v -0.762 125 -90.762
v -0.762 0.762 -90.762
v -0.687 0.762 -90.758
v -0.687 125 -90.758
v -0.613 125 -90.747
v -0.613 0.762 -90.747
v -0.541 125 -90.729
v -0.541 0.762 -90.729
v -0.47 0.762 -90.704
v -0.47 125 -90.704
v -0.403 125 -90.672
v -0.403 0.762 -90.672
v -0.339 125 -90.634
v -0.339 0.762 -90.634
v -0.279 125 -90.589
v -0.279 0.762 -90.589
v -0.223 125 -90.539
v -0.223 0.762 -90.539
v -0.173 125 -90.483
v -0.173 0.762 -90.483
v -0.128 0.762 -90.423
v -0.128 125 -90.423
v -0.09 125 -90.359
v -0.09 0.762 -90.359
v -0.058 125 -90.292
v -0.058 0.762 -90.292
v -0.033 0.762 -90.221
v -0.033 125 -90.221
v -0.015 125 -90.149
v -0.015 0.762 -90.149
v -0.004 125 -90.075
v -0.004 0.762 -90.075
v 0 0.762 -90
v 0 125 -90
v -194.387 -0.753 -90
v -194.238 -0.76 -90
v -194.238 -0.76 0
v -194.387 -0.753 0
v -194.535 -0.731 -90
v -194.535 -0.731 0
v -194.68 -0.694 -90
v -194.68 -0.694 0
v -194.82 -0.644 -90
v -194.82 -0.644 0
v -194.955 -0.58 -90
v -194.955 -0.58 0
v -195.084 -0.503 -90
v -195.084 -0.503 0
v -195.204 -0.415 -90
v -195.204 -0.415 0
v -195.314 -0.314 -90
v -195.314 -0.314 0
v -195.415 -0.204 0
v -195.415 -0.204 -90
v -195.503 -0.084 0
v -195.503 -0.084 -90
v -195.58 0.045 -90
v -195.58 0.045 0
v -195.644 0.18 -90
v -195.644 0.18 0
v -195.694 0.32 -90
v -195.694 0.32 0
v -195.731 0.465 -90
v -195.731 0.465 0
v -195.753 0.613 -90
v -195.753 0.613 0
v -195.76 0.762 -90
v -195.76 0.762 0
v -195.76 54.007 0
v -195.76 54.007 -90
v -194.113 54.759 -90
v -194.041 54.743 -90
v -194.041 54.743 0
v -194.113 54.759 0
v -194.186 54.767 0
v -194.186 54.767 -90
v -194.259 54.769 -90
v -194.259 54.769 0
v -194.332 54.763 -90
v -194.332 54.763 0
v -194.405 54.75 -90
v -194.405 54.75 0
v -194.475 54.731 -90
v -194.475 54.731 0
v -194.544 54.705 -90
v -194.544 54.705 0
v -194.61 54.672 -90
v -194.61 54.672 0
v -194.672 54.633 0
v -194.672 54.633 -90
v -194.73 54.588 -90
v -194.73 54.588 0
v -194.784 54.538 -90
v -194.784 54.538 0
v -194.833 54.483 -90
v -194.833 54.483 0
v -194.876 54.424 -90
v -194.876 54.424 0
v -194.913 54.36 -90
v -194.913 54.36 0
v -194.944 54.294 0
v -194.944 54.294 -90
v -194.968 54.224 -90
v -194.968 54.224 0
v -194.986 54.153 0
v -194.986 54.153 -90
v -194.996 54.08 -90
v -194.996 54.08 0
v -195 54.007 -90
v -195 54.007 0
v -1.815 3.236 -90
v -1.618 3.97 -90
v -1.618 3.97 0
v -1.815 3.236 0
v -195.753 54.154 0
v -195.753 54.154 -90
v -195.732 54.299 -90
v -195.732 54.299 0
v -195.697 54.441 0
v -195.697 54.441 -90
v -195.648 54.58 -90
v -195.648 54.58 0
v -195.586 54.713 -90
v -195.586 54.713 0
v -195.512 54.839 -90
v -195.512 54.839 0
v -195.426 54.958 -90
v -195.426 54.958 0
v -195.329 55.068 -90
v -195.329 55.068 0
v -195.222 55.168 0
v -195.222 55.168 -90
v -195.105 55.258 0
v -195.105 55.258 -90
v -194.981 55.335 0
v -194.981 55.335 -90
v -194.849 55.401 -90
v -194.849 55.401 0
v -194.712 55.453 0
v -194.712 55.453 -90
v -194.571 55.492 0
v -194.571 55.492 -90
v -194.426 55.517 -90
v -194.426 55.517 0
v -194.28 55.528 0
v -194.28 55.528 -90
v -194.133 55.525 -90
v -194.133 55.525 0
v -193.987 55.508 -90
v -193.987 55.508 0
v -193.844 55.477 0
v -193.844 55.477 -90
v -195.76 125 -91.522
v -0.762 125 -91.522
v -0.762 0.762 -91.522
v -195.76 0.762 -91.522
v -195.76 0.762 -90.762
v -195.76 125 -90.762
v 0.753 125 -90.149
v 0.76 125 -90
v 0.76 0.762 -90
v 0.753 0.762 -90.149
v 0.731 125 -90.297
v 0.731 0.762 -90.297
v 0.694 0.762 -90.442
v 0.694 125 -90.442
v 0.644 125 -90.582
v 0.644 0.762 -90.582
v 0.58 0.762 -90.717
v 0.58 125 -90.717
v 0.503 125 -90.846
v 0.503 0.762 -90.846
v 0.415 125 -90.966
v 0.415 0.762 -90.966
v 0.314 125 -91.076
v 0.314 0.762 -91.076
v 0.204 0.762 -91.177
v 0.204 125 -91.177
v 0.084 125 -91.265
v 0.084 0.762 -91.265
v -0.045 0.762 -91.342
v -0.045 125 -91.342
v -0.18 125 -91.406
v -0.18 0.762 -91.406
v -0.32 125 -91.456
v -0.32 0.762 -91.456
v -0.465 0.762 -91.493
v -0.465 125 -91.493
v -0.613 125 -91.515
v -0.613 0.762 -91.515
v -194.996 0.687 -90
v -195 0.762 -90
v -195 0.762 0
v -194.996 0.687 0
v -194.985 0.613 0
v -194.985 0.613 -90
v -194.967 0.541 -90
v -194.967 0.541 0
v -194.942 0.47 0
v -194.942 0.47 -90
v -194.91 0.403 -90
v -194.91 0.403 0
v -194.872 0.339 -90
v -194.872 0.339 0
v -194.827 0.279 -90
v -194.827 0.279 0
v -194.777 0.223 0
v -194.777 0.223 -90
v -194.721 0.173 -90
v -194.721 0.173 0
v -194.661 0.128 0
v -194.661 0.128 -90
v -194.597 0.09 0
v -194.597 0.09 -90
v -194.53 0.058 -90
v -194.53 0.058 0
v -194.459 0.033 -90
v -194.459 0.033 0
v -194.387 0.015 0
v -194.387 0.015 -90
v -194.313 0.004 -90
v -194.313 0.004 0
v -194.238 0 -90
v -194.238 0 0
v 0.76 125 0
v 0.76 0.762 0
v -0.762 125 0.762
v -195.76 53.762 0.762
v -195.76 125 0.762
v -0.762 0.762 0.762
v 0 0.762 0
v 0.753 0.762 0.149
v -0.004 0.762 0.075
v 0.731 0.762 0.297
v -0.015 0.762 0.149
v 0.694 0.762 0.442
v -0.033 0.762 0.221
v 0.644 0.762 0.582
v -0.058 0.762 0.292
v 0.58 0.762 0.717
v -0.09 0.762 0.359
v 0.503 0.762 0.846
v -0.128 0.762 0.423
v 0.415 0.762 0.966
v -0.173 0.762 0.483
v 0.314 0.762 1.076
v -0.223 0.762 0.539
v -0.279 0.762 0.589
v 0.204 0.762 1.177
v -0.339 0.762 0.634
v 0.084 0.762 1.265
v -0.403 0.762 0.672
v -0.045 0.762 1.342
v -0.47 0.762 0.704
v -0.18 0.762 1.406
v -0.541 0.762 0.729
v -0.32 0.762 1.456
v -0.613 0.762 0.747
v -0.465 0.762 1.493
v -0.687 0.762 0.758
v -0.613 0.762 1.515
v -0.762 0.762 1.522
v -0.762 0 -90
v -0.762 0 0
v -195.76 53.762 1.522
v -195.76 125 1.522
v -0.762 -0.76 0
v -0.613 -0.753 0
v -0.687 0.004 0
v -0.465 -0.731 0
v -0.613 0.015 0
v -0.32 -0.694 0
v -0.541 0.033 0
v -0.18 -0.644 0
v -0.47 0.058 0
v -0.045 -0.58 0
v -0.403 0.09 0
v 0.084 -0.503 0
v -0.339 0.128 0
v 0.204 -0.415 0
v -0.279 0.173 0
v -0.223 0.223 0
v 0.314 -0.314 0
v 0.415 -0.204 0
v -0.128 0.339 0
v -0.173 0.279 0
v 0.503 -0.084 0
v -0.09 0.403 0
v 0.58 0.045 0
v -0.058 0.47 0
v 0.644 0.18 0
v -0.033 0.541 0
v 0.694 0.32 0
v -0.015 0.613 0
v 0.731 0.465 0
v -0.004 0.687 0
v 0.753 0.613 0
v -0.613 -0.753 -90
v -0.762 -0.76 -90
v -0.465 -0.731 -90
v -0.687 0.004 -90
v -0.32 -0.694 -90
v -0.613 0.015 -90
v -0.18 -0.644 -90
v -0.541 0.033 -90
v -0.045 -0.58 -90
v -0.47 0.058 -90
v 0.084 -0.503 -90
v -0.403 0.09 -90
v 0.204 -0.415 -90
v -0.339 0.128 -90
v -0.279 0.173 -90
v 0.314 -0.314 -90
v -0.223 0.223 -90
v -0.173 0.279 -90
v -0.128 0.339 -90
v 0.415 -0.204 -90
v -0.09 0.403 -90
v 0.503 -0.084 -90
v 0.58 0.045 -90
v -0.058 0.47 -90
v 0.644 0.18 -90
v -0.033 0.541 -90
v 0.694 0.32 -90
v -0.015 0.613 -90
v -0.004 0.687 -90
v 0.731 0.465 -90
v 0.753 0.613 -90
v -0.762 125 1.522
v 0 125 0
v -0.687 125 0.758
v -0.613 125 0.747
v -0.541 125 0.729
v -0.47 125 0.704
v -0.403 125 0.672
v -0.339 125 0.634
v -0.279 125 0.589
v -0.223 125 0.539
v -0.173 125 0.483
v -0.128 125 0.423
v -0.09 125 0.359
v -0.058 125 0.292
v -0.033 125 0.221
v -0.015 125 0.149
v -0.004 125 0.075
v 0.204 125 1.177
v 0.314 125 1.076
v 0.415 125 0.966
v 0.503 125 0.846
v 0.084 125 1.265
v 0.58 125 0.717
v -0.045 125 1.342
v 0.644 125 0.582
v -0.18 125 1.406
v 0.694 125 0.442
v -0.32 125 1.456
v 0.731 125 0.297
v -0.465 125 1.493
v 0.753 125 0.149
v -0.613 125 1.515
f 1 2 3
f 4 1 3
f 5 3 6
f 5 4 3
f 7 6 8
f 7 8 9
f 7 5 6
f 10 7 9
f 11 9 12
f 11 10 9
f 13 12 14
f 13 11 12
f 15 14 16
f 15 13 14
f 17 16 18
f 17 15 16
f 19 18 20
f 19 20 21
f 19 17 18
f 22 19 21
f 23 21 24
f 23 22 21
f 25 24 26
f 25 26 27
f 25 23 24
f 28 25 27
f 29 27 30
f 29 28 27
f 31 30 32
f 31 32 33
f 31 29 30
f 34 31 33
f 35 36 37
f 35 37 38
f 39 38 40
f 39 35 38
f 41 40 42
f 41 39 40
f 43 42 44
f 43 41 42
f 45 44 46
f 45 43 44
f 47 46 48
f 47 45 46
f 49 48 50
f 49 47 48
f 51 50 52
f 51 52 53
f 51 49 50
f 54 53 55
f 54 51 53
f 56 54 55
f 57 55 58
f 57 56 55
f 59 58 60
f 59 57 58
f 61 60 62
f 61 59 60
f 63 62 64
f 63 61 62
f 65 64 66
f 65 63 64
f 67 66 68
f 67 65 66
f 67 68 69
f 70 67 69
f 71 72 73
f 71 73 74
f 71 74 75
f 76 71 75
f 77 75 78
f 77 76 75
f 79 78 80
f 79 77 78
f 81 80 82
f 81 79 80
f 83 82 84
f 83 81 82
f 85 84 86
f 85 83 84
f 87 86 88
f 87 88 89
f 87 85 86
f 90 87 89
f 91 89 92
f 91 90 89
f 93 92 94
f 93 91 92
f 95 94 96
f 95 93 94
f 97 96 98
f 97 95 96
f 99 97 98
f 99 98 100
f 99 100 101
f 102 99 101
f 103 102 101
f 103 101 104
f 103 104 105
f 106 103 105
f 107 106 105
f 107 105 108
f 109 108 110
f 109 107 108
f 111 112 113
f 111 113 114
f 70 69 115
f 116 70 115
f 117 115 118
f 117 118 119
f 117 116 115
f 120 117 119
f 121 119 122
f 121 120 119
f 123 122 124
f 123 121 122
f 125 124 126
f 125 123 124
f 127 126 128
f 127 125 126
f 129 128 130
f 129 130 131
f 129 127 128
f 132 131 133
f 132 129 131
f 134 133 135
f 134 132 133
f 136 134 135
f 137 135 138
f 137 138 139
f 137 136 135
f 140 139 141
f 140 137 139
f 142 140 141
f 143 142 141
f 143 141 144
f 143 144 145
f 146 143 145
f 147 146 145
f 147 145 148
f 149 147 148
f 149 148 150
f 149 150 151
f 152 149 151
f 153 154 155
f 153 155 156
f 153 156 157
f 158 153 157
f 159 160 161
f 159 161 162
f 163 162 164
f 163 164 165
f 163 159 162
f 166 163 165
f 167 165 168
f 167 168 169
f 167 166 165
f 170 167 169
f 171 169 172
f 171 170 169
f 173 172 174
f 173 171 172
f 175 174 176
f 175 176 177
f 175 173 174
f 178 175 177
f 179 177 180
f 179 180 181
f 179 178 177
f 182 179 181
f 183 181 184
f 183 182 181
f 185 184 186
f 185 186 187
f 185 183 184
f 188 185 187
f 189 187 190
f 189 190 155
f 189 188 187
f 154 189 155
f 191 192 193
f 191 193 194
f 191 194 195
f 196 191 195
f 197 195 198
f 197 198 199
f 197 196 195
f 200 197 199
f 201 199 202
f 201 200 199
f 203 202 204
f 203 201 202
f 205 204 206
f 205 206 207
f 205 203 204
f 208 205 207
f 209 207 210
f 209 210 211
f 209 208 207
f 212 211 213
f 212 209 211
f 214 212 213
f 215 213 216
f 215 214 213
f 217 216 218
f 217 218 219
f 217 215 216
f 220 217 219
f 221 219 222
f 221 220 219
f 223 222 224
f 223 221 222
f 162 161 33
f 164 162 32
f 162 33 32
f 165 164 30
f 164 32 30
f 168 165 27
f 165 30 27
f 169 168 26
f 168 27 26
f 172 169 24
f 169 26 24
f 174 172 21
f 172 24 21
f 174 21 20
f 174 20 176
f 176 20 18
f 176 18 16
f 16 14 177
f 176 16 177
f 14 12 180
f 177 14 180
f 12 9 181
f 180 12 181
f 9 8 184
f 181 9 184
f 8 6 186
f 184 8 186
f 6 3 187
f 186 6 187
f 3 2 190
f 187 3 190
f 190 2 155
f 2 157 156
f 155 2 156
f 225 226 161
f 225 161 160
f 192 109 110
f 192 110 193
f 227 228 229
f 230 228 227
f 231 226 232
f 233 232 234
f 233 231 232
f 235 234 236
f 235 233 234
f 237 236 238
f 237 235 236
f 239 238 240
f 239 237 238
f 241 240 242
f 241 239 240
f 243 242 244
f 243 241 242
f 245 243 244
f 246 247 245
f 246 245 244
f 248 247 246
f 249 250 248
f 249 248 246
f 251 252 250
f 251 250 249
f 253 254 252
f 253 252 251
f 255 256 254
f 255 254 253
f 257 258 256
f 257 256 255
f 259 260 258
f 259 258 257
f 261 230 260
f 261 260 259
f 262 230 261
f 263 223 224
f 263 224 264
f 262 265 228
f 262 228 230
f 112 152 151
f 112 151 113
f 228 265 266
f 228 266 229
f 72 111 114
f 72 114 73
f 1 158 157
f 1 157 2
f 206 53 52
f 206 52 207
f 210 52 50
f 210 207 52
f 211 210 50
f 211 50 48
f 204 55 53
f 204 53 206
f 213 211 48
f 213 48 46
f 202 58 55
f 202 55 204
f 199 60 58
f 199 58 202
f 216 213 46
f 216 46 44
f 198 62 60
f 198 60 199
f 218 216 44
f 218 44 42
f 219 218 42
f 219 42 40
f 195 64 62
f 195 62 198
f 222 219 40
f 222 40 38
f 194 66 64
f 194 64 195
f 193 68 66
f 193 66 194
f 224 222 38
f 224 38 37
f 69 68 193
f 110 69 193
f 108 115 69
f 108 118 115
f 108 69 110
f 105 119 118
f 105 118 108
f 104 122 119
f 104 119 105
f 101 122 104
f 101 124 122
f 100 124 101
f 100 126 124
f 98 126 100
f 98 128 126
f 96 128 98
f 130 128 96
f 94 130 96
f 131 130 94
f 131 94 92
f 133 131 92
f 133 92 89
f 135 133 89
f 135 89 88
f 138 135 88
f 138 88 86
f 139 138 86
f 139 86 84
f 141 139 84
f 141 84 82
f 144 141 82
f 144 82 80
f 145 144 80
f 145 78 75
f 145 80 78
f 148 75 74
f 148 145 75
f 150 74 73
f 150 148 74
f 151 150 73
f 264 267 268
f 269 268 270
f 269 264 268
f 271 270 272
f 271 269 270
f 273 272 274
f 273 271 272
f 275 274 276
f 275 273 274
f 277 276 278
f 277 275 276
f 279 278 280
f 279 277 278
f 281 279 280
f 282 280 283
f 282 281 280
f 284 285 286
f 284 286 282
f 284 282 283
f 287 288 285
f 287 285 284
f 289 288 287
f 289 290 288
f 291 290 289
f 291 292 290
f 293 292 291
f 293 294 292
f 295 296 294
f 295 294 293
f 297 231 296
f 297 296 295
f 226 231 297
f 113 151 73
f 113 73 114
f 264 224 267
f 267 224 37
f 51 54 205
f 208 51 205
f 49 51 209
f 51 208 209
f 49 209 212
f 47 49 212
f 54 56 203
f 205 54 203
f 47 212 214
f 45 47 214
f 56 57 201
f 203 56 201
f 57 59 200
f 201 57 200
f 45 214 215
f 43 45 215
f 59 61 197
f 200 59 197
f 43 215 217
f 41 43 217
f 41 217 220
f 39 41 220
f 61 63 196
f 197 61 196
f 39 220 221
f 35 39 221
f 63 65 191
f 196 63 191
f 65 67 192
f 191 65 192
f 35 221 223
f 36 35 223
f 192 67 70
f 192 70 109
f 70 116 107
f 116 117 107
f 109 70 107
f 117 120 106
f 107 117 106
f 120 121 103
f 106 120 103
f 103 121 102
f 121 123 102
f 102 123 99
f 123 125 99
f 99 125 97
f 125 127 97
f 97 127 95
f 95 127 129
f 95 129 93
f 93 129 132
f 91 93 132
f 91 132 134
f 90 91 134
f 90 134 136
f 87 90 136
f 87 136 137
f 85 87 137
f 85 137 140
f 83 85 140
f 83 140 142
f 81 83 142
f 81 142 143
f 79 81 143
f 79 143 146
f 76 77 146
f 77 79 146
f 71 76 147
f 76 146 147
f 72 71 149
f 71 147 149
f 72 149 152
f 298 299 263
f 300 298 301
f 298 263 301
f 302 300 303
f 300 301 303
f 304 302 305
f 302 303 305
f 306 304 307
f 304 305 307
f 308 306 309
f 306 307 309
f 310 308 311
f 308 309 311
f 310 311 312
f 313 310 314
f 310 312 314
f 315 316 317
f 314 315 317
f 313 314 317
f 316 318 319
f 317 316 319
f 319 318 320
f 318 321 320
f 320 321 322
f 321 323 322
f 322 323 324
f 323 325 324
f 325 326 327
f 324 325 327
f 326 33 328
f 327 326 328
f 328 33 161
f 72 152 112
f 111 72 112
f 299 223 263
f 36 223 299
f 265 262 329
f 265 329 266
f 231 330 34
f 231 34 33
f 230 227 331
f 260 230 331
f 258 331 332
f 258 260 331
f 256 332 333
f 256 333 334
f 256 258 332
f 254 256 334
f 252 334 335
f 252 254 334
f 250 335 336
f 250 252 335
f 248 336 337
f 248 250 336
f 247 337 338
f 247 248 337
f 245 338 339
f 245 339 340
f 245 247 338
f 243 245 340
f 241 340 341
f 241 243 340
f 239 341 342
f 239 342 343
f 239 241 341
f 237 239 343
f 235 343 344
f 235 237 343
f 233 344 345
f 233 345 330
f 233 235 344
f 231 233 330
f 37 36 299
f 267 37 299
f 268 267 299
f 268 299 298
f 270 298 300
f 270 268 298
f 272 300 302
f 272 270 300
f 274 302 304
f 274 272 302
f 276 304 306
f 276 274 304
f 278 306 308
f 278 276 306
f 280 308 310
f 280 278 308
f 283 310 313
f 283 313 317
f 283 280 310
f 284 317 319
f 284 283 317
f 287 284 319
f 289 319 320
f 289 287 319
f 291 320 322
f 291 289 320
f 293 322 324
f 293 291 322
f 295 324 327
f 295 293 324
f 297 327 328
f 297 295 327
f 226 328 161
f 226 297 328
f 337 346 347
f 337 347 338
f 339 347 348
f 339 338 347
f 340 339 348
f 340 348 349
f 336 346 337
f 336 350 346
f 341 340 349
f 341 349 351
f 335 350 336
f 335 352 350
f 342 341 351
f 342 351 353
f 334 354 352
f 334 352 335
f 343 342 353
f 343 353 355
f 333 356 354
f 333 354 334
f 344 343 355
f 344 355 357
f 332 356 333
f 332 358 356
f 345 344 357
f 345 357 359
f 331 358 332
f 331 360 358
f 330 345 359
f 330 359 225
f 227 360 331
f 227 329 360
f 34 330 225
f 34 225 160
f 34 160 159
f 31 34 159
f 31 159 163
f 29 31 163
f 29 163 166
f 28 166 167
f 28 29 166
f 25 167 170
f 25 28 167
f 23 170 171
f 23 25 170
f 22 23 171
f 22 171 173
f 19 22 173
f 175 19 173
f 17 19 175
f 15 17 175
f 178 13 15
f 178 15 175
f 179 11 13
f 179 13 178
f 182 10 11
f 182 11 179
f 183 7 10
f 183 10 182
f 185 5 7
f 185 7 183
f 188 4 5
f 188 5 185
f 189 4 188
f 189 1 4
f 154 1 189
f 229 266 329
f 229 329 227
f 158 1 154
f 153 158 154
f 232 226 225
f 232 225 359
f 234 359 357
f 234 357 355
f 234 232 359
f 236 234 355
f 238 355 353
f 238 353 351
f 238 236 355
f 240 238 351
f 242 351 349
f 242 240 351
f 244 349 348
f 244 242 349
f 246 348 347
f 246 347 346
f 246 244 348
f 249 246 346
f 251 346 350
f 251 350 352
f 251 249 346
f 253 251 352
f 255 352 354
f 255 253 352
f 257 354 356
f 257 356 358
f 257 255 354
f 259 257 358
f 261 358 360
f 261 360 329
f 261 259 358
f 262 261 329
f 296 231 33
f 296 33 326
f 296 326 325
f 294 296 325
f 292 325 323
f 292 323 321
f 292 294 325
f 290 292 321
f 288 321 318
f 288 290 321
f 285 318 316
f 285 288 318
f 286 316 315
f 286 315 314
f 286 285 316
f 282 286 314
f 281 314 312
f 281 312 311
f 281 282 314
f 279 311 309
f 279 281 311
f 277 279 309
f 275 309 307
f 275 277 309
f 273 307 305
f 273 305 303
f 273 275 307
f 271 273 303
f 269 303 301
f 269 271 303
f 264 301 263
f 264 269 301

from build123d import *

# Parameters (mm, degrees)
SKETCH3_W                    = 195
SKETCH3_H                    = 90
BASE_FLANGE1_DEPTH           = 0.76
EDGE_FLANGE1_STRIP_W         = 4.564
EDGE_FLANGE1_STRIP_H         = 0.76
EDGE_FLANGE1_STRIP_CUT_DEPTH = 90
EDGE_FLANGE1_DEPTH           = 90
EDGE_FLANGE2_STRIP_CUT_DEPTH = 90
EDGE_FLANGE2_DEPTH           = 90
EDGE_FLANGE3_STRIP_W         = 4.564
EDGE_FLANGE3_STRIP_H         = 0.76
EDGE_FLANGE3_STRIP_CUT_DEPTH = 90
EDGE_FLANGE3_DEPTH           = 90
EDGE_FLANGE6_DEPTH           = 124.238
EDGE_FLANGE7_DEPTH           = 124.238
CUT_EXTRUDE1_REACH           = 252.208


# Sheet-metal steps are written as plain solids
with BuildPart() as part:
    # Sketch3 → Base-Flange1 (new body)
    with BuildSketch(Plane(origin=(0, 0, 0), x_dir=(1, 0, 0), z_dir=(0, 1, 0))):
        with Locations((-97.5, 45)):
            Rectangle(SKETCH3_W, SKETCH3_H)
    extrude(amount=-BASE_FLANGE1_DEPTH)

    # Edge-Flange1 strip (across the edge) → Edge-Flange1 strip cut (cut)
    with BuildSketch(Plane(origin=(-195, 0, -90), x_dir=(1, 0, 0), z_dir=(0, 0, 1))):
        with Locations((-1.52, -0.38)):
            Rectangle(EDGE_FLANGE1_STRIP_W, EDGE_FLANGE1_STRIP_H)
    extrude(amount=EDGE_FLANGE1_STRIP_CUT_DEPTH, mode=Mode.SUBTRACT)

    # Edge-Flange1 section (across the edge) → Edge-Flange1 (add)
    with BuildSketch(Plane(origin=(-195, 0, -90), x_dir=(1, 0, 0), z_dir=(0, 0, 1))):
        with BuildLine():
            Line((-0.76, 0.762), (-0.76, 55))
            Line((-0.76, 55), (0, 55))
            Line((0, 55), (0, 0.762))
            ThreePointArc((0, 0.762), (0.223184633, 0.223184633), (0.762, 0))
            Line((0.762, 0), (0.762, -0.76))
            ThreePointArc((0.762, -0.76), (-0.314216521, -0.314216521), (-0.76, 0.762))
        make_face()
    extrude(amount=EDGE_FLANGE1_DEPTH)

    # Edge-Flange2 strip (across the edge) → Edge-Flange2 strip cut (cut)
    with BuildSketch(Plane(origin=(-195, 55, -90), x_dir=(-0.2588190451025146, -0.96592582628907, 0), z_dir=(0, 0, 1))):
        Polygon((-4.589327535, -2.016516504), (1.155922587, -0.477081374), (0.959220112, 0.257022254), (-4.786030009, -1.282412876), align=None)
    extrude(amount=EDGE_FLANGE2_STRIP_CUT_DEPTH, mode=Mode.SUBTRACT)

    # Edge-Flange2 section (across the edge) → Edge-Flange2 (add)
    with BuildSketch(Plane(origin=(-195, 55, -90), x_dir=(-0.2588190451025146, -0.96592582628907, 0), z_dir=(0, 0, 1))):
        with BuildLine():
            Line((-0.76, 0.993057734), (-0.76, 200))
            Line((-0.76, 200), (0, 200))
            Line((0, 200), (0, 0.993057734))
            ThreePointArc((0, 0.993057734), (0.298123791, 0.388522489), (0.959220112, 0.257022254))
            Line((0.959220112, 0.257022254), (1.155922587, -0.477081374))
            ThreePointArc((1.155922587, -0.477081374), (-0.164534895, -0.21442605), (-0.76, 0.993057734))
        make_face()
    extrude(amount=EDGE_FLANGE2_DEPTH)

    # Edge-Flange3 strip (across the edge) → Edge-Flange3 strip cut (cut)
    with BuildSketch(Plane(origin=(0, 0, 0), x_dir=(-1, 0, 0), z_dir=(0, 0, -1))):
        with Locations((-1.52, -0.38)):
            Rectangle(EDGE_FLANGE3_STRIP_W, EDGE_FLANGE3_STRIP_H)
    extrude(amount=EDGE_FLANGE3_STRIP_CUT_DEPTH, mode=Mode.SUBTRACT)

    # Edge-Flange3 section (across the edge) → Edge-Flange3 (add)
    with BuildSketch(Plane(origin=(0, 0, 0), x_dir=(-1, 0, 0), z_dir=(0, 0, -1))):
        with BuildLine():
            Line((-0.76, 0.762), (-0.76, 125))
            Line((-0.76, 125), (0, 125))
            Line((0, 125), (0, 0.762))
            ThreePointArc((0, 0.762), (0.223184633, 0.223184633), (0.762, 0))
            Line((0.762, 0), (0.762, -0.76))
            ThreePointArc((0.762, -0.76), (-0.314216521, -0.314216521), (-0.76, 0.762))
        make_face()
    extrude(amount=EDGE_FLANGE3_DEPTH)

    # Edge-Flange6 section (across the edge) → Edge-Flange6 (add)
    with BuildSketch(Plane(origin=(0, 0.762, 0.762), x_dir=(0, 0, -1), z_dir=(0, 1, 0))):
        with BuildLine():
            Line((-0.76, 0.762), (-0.76, 195.76))
            Line((-0.76, 195.76), (0, 195.76))
            Line((0, 195.76), (0, 0.762))
            ThreePointArc((0, 0.762), (0.223184633, 0.223184633), (0.762, 0))
            Line((0.762, 0), (0.762, -0.76))
            ThreePointArc((0.762, -0.76), (-0.314216521, -0.314216521), (-0.76, 0.762))
        make_face()
    extrude(amount=EDGE_FLANGE6_DEPTH)

    # Edge-Flange7 section (across the edge) → Edge-Flange7 (add)
    with BuildSketch(Plane(origin=(0, 125, -90.762), x_dir=(0, 0, 1), z_dir=(0, -1, 0))):
        with BuildLine():
            Line((-0.76, 0.762), (-0.76, 195.76))
            Line((-0.76, 195.76), (0, 195.76))
            Line((0, 195.76), (0, 0.762))
            ThreePointArc((0, 0.762), (0.223184633, 0.223184633), (0.762, 0))
            Line((0.762, 0), (0.762, -0.76))
            ThreePointArc((0.762, -0.76), (-0.314216521, -0.314216521), (-0.76, 0.762))
        make_face()
    extrude(amount=EDGE_FLANGE7_DEPTH)

    # Sketch29 → Cut-Extrude1 (cut, up to next)
    with BuildSketch(Plane.XY.offset(1.522), mode=Mode.PRIVATE) as cut_extrude1_sk1:
        Polygon((-195.76, 53.762), (-0.762, 0.762), (-195.76, 0.762), align=None)
    cut_extrude1_tool1 = extrude(cut_extrude1_sk1.sketch, amount=-CUT_EXTRUDE1_REACH, mode=Mode.PRIVATE) & part.part
    add(cut_extrude1_tool1.solids().sort_by_distance((-130.760667, 18.428667, 1.522))[0], mode=Mode.SUBTRACT)


solid = part.part
